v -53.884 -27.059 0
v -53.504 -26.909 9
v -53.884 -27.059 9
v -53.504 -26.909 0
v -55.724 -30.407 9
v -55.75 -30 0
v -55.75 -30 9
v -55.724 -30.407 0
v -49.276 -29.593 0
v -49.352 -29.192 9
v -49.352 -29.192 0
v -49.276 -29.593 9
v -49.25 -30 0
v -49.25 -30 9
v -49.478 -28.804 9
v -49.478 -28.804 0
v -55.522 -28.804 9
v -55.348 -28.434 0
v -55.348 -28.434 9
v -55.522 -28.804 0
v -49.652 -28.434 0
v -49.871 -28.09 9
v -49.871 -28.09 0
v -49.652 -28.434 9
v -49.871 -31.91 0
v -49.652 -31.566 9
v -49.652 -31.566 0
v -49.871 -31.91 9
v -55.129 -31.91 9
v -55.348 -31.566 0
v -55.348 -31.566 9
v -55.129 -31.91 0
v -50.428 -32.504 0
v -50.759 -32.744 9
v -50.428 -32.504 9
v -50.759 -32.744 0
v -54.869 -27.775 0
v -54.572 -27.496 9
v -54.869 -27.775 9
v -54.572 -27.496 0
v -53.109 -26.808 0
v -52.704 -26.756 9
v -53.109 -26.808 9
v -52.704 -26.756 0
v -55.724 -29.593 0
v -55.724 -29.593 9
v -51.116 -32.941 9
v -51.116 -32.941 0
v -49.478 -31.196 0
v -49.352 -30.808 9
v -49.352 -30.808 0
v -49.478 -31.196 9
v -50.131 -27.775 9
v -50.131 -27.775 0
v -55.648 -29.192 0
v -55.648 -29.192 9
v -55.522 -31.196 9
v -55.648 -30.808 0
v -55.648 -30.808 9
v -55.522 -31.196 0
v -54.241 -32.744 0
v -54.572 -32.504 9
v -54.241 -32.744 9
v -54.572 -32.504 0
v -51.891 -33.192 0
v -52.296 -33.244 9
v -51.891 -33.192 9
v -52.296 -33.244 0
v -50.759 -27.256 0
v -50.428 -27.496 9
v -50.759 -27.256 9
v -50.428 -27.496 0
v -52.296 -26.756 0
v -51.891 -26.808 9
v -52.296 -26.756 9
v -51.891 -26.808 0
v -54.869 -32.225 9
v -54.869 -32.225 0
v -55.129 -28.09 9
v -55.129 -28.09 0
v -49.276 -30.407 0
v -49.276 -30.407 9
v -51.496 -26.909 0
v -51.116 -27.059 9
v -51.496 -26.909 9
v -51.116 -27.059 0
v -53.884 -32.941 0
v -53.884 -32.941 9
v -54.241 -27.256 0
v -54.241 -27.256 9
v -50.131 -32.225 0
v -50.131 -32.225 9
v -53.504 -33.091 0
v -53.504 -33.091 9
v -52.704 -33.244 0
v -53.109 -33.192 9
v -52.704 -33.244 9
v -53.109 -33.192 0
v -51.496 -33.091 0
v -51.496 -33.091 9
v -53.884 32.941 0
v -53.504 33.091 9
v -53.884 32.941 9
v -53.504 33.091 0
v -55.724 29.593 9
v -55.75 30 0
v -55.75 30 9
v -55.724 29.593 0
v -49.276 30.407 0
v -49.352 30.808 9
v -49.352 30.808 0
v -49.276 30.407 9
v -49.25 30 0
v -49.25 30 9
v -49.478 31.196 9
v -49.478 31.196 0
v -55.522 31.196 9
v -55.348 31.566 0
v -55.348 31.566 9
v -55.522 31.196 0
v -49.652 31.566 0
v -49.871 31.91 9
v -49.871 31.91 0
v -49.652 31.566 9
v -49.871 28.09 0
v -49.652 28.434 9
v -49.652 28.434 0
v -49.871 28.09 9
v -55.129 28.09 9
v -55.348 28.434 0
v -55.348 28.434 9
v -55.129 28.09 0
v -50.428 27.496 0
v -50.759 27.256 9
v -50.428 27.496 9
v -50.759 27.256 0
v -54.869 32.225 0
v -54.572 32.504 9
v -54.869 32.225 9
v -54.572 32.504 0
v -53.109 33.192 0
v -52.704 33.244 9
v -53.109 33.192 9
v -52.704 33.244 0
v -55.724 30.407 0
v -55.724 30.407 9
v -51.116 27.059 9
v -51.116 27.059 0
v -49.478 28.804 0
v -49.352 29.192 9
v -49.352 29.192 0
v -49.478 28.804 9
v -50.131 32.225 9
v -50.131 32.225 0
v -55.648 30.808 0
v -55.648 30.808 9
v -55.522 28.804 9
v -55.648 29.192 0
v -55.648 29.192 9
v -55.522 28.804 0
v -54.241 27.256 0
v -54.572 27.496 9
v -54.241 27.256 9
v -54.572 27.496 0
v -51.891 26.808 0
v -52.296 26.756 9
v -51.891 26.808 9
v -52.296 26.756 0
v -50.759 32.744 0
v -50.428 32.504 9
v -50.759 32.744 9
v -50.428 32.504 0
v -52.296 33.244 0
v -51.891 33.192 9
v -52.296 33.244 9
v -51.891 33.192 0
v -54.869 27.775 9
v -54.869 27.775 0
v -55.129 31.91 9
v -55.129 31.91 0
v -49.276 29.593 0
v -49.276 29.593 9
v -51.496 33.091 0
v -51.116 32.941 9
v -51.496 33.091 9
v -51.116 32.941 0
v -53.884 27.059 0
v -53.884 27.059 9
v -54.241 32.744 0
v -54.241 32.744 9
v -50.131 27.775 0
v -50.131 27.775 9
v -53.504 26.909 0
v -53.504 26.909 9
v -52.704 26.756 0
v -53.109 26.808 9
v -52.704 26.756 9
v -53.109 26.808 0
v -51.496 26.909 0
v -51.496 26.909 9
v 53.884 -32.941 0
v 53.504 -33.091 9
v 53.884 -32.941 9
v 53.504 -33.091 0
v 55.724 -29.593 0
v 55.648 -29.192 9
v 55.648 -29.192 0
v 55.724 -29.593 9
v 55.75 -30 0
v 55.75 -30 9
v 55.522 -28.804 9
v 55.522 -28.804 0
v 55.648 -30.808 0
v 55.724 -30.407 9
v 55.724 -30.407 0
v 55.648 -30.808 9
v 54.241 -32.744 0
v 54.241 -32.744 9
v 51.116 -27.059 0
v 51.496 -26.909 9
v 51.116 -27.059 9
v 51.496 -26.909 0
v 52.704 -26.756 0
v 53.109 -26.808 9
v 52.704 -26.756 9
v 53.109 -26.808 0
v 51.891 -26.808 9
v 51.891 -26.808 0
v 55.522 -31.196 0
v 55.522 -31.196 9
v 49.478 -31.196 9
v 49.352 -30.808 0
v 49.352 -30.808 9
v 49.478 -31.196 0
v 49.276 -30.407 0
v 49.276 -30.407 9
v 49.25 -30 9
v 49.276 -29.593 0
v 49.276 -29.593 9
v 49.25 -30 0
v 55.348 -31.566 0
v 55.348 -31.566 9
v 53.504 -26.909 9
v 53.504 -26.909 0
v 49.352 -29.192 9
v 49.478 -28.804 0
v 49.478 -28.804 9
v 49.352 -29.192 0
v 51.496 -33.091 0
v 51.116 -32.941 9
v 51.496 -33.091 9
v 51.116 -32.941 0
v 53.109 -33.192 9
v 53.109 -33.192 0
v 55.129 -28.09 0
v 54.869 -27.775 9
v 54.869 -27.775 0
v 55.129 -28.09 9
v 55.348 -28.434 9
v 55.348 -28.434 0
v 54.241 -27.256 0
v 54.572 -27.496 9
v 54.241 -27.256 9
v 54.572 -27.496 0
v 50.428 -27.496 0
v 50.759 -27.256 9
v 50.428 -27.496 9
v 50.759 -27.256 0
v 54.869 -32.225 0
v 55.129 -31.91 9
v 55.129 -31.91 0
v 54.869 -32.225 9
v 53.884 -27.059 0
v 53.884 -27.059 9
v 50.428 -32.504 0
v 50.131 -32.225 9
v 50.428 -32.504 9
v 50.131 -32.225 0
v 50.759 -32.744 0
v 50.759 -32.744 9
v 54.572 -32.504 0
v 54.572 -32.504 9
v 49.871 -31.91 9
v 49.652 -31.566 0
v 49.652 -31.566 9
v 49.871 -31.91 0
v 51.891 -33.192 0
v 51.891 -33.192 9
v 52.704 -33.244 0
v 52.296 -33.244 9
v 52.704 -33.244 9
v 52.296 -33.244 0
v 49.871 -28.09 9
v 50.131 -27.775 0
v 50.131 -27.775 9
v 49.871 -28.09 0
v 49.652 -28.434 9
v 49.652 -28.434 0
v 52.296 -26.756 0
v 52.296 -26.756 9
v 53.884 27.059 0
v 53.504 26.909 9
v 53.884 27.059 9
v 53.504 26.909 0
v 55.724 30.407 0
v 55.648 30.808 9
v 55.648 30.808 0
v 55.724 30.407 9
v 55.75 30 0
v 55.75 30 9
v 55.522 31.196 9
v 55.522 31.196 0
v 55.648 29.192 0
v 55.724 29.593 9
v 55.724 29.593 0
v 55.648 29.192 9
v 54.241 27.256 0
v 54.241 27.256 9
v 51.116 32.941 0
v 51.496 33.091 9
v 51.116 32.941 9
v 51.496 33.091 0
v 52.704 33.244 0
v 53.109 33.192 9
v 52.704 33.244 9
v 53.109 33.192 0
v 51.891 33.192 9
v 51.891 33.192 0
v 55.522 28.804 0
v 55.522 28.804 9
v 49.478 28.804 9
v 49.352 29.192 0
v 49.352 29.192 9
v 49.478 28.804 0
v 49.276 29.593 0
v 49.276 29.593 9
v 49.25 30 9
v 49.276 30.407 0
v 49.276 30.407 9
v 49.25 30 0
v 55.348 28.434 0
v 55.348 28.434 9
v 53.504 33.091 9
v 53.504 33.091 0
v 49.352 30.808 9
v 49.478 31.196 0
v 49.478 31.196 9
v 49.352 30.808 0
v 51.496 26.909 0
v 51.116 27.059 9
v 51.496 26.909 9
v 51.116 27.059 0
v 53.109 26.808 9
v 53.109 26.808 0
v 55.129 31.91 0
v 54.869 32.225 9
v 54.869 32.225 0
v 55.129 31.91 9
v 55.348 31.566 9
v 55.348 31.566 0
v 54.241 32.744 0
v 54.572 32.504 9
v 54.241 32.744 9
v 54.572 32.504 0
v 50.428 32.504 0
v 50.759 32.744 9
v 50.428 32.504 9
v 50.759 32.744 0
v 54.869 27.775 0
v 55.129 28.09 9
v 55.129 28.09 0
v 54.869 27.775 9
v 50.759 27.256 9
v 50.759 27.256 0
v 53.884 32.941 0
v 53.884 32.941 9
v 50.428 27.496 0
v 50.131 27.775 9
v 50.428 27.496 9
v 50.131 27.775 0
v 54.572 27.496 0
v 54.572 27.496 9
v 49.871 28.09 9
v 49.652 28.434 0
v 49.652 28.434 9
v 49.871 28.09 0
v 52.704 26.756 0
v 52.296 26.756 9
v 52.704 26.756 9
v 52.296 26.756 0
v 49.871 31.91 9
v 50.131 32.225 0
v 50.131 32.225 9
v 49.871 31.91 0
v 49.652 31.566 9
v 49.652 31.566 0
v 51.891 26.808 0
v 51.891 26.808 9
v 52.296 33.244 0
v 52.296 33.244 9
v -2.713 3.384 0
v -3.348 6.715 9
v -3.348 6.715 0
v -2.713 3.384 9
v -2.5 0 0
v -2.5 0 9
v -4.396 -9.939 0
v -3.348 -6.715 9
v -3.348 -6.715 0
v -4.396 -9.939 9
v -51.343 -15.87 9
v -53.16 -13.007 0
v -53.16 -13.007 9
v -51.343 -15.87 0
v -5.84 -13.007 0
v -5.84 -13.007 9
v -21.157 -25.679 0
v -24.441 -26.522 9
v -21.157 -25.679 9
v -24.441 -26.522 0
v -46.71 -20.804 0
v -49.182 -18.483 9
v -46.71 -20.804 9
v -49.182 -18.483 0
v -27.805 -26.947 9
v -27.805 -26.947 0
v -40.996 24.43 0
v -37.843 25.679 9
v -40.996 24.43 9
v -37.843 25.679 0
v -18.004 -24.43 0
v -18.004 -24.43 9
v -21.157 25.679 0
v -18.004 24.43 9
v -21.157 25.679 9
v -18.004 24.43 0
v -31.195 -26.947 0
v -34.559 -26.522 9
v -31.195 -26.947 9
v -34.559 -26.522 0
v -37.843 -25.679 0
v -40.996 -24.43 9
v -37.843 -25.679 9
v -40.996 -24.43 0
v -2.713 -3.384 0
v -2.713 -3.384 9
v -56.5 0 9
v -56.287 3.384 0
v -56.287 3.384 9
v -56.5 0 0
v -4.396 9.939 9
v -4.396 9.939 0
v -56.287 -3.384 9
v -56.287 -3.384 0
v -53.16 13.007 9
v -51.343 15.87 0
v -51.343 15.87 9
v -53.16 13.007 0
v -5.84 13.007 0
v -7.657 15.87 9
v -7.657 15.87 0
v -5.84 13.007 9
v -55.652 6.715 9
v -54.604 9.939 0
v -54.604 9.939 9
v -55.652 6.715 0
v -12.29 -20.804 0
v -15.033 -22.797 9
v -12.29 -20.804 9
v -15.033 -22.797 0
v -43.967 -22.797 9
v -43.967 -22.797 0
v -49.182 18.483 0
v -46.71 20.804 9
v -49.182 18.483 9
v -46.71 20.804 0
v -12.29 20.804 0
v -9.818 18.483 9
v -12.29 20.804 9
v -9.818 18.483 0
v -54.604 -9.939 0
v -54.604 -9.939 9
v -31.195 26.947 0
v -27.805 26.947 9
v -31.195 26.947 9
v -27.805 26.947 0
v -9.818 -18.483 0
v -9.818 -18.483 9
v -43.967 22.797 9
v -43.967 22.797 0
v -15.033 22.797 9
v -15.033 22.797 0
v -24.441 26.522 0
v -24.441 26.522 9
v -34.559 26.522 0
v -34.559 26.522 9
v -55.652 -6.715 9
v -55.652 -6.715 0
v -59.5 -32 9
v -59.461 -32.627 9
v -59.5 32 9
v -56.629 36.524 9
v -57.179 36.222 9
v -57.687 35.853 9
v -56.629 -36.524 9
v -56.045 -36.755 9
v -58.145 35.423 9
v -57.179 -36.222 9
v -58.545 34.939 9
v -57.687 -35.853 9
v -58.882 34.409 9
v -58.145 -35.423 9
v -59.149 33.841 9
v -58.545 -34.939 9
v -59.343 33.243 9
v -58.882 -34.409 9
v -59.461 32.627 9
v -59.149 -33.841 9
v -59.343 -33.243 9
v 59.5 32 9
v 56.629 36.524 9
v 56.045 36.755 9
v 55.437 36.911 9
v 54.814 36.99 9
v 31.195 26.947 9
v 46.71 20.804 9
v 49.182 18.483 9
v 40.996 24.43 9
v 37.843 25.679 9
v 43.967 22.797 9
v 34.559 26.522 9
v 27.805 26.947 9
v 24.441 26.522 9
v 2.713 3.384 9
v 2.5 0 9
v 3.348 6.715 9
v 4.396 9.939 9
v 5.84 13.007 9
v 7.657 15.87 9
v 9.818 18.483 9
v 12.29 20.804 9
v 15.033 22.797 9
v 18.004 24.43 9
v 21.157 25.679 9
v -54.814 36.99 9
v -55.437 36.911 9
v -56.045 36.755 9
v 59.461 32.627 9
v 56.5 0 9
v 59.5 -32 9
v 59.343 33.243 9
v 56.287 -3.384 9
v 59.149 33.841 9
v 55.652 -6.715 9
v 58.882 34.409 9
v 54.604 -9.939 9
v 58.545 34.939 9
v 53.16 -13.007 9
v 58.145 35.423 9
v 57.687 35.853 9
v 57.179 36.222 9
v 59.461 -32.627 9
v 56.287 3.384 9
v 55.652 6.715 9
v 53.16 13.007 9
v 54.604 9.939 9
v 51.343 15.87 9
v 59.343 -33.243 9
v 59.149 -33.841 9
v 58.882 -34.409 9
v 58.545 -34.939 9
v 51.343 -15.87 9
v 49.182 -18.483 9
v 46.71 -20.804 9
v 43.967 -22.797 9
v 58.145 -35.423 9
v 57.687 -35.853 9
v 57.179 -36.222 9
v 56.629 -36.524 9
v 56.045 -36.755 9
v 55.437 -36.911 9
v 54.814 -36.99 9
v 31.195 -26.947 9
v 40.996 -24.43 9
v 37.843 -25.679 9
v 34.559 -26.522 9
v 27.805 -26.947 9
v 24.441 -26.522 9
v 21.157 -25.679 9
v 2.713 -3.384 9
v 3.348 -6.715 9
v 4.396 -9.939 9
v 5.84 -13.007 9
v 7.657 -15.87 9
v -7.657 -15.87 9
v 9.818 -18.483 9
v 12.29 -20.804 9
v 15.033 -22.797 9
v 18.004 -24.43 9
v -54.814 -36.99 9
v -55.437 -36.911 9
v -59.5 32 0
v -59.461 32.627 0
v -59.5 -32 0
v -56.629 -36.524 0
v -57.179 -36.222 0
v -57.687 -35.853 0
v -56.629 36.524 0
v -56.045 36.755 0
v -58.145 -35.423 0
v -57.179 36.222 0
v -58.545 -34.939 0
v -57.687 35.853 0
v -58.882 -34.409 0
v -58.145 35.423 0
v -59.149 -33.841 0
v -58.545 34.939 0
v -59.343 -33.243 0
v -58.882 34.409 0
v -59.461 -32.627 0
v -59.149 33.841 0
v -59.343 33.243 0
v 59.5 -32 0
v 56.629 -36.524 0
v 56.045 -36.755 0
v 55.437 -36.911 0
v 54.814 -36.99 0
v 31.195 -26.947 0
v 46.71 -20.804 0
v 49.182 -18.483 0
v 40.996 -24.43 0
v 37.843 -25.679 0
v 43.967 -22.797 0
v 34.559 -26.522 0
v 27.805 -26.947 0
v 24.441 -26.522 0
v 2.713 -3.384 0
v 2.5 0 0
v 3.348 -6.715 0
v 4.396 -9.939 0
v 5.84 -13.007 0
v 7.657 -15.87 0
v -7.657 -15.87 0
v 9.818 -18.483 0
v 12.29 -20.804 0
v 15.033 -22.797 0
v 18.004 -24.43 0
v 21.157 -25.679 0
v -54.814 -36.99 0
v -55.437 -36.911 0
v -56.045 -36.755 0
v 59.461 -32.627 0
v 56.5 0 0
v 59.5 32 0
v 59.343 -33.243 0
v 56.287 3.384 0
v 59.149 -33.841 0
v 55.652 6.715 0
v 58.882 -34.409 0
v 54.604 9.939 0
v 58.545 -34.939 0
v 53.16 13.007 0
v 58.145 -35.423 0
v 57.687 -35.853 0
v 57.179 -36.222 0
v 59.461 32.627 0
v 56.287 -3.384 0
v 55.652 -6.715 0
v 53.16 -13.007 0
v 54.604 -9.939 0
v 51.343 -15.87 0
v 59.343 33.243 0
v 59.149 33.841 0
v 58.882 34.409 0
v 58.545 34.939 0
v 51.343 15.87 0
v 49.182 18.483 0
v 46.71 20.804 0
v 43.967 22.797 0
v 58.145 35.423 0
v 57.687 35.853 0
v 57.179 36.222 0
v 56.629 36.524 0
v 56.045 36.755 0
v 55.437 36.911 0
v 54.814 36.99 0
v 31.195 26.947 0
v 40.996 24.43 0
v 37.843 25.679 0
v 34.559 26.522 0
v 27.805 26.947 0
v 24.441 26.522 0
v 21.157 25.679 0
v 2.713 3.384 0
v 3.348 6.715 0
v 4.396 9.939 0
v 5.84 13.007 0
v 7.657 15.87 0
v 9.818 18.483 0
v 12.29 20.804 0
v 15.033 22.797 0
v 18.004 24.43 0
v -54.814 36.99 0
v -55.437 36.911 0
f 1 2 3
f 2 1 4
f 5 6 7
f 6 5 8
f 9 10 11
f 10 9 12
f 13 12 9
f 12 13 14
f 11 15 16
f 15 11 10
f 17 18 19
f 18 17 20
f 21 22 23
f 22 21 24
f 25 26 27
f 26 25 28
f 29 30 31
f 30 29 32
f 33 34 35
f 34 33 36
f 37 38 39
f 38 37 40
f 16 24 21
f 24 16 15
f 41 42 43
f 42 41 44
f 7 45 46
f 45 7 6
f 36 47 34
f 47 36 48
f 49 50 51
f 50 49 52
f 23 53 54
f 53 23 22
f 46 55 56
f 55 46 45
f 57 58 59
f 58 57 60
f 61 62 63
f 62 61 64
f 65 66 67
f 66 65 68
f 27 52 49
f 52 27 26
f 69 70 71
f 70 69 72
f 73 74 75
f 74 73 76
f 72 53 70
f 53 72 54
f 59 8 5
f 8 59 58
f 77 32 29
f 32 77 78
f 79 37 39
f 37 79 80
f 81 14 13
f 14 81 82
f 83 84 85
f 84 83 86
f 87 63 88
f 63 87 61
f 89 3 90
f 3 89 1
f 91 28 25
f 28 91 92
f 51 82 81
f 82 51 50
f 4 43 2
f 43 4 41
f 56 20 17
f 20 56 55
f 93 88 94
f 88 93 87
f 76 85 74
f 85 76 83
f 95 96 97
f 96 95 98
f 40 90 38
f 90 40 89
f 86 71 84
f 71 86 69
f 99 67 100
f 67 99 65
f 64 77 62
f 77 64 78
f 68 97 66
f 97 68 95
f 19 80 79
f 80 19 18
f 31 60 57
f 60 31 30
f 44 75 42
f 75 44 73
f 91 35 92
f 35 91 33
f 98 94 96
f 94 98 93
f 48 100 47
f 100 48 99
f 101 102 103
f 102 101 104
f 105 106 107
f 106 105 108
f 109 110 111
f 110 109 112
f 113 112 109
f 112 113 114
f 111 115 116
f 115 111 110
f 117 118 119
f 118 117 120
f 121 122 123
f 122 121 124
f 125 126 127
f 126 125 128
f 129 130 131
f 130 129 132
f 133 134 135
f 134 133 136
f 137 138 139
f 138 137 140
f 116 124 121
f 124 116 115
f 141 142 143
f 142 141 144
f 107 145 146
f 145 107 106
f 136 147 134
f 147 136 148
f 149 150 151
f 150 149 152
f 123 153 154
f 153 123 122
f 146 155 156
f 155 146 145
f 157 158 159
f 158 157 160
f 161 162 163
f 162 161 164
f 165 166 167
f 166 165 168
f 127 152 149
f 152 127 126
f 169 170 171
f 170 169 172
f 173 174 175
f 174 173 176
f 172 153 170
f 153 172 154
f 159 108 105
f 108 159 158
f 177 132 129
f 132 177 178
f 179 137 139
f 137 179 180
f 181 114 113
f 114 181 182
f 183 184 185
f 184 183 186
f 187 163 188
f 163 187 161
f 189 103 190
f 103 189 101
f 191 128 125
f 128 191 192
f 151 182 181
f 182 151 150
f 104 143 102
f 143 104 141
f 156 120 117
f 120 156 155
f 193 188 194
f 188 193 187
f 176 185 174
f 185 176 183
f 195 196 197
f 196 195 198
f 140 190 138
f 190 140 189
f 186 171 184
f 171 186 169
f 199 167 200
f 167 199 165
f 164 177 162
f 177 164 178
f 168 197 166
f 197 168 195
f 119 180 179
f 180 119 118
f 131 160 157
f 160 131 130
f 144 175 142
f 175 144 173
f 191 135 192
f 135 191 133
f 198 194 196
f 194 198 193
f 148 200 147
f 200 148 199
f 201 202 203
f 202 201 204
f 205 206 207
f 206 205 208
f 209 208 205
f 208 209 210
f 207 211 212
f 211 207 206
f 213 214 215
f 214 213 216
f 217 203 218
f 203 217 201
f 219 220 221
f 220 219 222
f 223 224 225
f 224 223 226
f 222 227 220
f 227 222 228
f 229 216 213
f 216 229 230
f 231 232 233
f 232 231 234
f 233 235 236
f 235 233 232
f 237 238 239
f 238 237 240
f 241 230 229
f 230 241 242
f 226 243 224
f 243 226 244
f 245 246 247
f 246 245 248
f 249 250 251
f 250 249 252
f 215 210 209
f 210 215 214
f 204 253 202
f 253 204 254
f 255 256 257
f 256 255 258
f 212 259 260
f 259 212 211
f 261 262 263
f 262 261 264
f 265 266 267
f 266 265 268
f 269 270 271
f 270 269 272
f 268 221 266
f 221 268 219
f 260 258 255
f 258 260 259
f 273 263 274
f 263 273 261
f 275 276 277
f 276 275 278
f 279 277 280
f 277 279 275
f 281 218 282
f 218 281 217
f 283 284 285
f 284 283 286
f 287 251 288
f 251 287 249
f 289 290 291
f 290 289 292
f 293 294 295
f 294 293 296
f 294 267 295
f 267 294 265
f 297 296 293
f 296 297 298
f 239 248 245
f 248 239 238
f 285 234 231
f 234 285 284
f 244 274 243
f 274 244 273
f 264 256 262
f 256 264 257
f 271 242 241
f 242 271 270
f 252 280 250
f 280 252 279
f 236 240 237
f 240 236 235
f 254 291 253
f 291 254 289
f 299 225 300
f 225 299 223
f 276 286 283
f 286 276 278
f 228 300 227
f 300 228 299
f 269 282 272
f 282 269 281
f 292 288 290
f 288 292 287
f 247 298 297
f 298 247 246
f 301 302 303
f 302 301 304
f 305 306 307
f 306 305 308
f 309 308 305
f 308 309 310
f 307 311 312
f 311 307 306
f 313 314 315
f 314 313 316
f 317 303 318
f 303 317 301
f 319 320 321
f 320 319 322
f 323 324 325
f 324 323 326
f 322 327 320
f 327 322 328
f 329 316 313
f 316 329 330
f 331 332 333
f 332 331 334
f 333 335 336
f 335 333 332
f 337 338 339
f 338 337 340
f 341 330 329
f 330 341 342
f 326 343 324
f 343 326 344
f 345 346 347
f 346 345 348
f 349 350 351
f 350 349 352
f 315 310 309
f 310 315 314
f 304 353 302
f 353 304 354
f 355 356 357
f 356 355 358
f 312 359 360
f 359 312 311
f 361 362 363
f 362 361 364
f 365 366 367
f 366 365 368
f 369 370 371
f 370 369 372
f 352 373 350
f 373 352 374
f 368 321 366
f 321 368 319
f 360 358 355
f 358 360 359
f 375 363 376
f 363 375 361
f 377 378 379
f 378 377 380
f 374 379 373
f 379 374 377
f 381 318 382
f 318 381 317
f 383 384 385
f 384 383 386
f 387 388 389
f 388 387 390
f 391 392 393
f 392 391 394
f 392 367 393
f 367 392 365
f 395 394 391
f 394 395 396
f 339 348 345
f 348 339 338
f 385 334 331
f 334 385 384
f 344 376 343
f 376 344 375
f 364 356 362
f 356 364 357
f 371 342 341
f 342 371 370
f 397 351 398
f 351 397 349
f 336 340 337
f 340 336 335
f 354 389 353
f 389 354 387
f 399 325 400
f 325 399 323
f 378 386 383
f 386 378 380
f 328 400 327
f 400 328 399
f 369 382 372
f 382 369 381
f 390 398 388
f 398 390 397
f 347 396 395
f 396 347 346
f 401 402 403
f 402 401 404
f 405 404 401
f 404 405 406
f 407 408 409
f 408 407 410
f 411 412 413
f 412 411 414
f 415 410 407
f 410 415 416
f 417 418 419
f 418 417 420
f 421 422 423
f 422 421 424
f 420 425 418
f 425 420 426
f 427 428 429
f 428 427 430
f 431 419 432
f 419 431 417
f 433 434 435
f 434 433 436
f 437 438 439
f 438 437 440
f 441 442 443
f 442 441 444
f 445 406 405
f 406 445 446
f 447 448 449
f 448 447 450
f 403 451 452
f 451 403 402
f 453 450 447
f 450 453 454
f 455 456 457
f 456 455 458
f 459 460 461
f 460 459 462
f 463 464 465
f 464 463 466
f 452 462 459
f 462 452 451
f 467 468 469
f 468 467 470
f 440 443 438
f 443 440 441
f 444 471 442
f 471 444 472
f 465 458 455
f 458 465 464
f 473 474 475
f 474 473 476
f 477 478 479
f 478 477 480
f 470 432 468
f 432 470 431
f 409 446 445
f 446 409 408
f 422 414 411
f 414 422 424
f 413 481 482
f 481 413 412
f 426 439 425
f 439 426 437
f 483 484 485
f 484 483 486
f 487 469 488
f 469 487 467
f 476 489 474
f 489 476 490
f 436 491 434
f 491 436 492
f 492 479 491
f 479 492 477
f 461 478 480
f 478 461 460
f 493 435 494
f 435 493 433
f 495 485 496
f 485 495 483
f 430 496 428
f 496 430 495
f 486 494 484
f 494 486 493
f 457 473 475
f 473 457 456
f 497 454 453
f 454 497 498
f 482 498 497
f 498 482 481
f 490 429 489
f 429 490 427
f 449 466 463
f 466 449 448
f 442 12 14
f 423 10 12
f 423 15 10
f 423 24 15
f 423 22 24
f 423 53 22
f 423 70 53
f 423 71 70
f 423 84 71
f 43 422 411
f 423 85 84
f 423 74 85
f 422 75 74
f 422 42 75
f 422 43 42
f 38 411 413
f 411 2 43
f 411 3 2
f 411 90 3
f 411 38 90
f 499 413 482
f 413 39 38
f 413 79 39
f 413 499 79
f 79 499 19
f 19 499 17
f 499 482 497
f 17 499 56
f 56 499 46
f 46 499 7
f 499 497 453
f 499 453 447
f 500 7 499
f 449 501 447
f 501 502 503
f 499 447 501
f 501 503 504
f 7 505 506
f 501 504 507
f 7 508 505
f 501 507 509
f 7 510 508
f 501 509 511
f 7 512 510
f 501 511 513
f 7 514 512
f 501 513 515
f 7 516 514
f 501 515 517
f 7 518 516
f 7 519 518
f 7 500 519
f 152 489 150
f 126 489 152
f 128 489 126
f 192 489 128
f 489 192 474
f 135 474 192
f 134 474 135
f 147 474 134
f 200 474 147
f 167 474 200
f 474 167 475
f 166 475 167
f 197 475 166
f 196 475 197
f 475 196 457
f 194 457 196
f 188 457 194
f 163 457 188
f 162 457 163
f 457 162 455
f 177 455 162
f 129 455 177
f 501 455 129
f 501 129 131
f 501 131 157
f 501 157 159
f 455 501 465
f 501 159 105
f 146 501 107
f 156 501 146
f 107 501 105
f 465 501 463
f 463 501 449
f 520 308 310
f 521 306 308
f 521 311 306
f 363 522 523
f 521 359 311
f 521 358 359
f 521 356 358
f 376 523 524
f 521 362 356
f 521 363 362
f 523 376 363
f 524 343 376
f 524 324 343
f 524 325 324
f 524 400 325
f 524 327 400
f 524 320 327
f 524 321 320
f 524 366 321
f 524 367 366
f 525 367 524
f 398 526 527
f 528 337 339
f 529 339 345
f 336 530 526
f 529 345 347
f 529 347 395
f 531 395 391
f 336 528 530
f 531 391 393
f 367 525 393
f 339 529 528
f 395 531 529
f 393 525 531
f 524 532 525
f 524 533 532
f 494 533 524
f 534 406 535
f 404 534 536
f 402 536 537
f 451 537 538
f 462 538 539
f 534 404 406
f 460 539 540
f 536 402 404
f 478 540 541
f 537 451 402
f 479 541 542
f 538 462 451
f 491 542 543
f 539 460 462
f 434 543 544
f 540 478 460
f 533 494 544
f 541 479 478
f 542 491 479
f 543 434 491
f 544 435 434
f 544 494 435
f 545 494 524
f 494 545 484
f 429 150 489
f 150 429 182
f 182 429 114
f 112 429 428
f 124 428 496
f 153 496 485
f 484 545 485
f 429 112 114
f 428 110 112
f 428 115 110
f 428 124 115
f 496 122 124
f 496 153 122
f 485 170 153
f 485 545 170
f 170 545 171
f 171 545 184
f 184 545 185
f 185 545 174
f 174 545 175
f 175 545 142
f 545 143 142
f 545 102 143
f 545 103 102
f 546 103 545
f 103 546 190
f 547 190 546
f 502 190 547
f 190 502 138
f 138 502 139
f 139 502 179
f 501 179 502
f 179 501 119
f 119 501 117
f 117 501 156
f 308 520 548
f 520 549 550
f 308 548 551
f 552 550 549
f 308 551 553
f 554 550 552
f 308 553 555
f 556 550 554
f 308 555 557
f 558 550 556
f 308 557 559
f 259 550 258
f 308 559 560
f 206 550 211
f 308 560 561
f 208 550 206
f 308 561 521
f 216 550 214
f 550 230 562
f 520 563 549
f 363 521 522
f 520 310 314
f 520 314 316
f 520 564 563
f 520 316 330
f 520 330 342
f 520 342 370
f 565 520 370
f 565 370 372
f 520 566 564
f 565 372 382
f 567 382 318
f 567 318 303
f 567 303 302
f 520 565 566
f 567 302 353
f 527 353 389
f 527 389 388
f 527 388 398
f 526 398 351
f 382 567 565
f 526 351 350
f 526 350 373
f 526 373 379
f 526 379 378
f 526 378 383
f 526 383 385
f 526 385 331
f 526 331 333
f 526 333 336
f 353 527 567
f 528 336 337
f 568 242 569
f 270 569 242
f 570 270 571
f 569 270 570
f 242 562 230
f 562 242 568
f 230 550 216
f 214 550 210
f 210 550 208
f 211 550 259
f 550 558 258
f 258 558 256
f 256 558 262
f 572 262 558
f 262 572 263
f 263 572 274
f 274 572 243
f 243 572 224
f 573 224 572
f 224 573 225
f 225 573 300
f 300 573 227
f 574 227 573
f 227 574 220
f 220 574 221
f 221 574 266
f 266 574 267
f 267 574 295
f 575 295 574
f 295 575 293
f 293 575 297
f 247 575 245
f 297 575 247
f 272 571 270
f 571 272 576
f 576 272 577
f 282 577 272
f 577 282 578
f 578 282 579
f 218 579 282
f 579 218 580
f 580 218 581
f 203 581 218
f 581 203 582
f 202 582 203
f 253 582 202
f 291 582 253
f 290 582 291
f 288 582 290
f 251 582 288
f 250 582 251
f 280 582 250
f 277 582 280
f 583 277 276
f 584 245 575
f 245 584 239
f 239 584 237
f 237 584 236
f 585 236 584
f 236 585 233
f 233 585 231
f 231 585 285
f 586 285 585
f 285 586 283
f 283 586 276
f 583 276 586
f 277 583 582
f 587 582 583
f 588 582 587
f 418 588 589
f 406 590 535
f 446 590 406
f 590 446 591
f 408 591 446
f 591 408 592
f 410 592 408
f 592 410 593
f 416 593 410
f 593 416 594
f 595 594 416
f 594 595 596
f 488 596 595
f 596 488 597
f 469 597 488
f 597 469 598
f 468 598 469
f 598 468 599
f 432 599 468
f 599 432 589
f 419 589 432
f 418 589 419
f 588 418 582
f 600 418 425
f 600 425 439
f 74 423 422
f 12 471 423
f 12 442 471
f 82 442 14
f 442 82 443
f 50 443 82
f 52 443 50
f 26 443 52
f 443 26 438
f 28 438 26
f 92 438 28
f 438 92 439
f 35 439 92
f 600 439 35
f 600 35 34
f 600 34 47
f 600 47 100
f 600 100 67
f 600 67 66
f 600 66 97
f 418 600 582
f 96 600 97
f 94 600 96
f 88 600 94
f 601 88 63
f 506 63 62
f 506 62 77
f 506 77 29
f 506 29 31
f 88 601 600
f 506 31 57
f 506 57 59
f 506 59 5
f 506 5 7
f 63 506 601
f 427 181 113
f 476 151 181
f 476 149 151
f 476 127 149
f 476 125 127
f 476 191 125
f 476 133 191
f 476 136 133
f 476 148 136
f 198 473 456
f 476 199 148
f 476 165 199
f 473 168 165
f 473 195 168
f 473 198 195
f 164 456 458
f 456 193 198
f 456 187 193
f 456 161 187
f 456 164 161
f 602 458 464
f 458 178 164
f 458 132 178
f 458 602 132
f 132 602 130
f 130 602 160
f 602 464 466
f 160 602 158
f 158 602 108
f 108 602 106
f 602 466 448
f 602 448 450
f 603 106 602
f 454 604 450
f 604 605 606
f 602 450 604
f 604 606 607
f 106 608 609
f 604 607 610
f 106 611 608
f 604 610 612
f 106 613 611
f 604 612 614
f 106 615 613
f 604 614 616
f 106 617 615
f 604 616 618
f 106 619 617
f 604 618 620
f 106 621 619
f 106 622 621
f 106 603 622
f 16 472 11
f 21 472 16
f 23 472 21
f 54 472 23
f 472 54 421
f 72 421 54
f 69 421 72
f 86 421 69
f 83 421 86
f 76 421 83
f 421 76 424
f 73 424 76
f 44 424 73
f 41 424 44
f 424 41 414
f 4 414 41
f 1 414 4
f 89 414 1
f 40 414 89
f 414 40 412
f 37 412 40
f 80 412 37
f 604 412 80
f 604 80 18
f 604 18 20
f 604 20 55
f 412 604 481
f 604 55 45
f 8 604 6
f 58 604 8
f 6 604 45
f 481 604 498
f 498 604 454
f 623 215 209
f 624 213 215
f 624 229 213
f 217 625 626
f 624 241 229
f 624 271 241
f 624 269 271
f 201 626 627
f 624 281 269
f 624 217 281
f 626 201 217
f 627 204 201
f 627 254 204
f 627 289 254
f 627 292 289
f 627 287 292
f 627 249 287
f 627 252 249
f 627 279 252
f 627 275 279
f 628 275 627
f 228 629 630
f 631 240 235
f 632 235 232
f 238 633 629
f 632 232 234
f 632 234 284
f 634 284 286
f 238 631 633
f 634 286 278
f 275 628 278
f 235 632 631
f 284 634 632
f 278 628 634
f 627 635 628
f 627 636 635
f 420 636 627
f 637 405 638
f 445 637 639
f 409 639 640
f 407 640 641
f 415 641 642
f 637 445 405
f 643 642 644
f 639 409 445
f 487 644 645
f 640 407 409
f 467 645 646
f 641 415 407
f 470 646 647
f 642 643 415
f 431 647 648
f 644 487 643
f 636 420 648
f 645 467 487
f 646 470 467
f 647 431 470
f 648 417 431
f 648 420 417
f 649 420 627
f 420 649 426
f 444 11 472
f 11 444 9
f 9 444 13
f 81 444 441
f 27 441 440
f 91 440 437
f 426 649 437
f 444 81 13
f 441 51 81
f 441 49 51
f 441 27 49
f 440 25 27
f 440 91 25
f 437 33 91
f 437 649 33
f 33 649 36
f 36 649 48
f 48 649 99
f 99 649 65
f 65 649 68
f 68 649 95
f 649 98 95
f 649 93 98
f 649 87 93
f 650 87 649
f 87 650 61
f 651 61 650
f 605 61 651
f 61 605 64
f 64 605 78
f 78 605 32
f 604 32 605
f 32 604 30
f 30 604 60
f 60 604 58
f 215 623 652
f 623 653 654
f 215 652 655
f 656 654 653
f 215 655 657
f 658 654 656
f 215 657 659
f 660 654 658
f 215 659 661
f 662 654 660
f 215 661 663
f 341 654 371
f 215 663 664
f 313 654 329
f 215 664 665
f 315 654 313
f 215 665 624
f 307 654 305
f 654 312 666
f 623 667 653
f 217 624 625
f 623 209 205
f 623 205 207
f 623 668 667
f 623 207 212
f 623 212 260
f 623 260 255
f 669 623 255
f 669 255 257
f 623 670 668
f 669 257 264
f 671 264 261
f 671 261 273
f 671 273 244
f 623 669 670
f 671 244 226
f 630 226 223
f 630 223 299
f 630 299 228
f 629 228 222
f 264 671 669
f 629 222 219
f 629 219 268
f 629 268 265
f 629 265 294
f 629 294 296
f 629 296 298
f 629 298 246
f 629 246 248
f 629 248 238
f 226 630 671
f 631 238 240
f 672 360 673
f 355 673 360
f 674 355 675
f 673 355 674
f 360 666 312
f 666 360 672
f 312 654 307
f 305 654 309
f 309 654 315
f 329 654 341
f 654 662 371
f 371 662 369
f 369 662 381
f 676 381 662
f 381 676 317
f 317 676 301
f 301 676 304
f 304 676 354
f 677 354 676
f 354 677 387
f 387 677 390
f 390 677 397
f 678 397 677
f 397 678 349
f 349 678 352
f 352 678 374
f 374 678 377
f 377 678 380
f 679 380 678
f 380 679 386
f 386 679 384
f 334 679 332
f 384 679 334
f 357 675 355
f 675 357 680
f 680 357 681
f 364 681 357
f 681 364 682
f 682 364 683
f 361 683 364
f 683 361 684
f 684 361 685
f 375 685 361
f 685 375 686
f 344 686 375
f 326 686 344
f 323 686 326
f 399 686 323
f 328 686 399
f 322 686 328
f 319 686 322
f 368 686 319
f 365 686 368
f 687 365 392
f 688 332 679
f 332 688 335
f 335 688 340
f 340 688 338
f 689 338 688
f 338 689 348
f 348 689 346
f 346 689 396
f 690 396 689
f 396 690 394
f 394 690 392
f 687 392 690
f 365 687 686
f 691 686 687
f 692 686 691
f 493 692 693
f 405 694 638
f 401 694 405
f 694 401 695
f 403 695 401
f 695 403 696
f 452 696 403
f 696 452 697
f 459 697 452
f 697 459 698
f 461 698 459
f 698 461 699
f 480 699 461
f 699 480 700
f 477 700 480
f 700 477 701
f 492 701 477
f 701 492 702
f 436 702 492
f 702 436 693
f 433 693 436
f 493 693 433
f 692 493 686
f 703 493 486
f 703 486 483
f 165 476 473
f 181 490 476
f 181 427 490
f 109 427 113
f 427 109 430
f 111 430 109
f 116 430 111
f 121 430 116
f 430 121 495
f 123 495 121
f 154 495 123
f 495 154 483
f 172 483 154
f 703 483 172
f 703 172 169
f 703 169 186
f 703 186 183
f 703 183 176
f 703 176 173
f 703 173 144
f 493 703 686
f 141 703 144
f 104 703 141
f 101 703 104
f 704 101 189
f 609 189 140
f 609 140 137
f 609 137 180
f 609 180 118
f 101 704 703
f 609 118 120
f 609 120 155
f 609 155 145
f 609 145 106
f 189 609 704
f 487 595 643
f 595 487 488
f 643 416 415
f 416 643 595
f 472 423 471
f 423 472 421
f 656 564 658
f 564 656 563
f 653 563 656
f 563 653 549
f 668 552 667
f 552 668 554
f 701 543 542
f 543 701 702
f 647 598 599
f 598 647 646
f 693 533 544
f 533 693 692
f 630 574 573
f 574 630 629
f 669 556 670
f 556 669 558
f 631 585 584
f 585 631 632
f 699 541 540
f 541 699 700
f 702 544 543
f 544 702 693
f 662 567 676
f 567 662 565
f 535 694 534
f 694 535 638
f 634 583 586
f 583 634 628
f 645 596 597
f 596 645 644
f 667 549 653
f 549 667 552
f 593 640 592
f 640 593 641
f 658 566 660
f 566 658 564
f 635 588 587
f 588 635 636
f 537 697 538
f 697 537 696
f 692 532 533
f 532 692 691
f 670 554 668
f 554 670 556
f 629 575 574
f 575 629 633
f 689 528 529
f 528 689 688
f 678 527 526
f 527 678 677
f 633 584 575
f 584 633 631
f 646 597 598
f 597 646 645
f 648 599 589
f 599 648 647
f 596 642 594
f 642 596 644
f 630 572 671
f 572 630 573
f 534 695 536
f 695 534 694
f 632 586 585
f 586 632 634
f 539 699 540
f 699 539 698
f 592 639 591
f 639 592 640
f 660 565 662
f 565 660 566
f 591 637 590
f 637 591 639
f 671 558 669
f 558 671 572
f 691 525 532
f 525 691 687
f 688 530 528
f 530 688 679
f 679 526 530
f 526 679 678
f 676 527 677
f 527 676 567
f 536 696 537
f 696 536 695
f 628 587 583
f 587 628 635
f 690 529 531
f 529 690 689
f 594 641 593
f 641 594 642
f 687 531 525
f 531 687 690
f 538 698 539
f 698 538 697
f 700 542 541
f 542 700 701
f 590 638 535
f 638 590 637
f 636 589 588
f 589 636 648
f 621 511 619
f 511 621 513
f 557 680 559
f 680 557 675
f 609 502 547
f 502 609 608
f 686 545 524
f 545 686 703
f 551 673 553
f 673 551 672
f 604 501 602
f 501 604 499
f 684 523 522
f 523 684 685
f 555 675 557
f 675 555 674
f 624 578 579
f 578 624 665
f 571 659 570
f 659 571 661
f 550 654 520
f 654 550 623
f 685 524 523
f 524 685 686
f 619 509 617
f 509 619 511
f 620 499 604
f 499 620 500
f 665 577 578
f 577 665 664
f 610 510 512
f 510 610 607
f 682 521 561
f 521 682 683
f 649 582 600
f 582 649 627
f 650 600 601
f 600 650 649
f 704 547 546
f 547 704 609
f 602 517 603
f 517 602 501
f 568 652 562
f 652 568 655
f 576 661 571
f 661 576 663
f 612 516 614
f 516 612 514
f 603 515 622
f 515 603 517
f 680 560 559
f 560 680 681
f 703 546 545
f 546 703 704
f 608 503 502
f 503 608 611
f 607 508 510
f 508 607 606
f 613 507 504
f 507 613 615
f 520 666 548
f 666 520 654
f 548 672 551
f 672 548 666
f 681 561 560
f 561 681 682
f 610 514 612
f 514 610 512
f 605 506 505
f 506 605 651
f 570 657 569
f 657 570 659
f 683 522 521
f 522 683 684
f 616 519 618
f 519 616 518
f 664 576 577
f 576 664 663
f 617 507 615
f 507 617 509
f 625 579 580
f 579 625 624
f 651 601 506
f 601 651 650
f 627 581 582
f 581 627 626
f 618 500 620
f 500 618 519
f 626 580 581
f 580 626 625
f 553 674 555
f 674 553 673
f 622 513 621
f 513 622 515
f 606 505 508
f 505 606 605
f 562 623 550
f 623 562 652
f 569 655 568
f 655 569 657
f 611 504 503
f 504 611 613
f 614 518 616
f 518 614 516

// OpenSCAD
$fn = 50;


difference() {
	union() {
		hull() {
			translate(v = [-54.5000000000, 32.0000000000, 0]) {
				cylinder(h = 9, r = 5);
			}
			translate(v = [54.5000000000, 32.0000000000, 0]) {
				cylinder(h = 9, r = 5);
			}
			translate(v = [-54.5000000000, -32.0000000000, 0]) {
				cylinder(h = 9, r = 5);
			}
			translate(v = [54.5000000000, -32.0000000000, 0]) {
				cylinder(h = 9, r = 5);
			}
		}
	}
	union() {
		#translate(v = [-52.5000000000, -30.0000000000, -100.0000000000]) {
			cylinder(h = 200, r = 3.2500000000);
		}
		#translate(v = [-52.5000000000, 30.0000000000, -100.0000000000]) {
			cylinder(h = 200, r = 3.2500000000);
		}
		#translate(v = [52.5000000000, -30.0000000000, -100.0000000000]) {
			cylinder(h = 200, r = 3.2500000000);
		}
		#translate(v = [52.5000000000, 30.0000000000, -100.0000000000]) {
			cylinder(h = 200, r = 3.2500000000);
		}
		#translate(v = [-29.5000000000, 0, 0]) {
			cylinder(h = 9, r = 27.0000000000);
		}
		#translate(v = [29.5000000000, 0, 0]) {
			cylinder(h = 9, r = 27.0000000000);
		}
	}
}
